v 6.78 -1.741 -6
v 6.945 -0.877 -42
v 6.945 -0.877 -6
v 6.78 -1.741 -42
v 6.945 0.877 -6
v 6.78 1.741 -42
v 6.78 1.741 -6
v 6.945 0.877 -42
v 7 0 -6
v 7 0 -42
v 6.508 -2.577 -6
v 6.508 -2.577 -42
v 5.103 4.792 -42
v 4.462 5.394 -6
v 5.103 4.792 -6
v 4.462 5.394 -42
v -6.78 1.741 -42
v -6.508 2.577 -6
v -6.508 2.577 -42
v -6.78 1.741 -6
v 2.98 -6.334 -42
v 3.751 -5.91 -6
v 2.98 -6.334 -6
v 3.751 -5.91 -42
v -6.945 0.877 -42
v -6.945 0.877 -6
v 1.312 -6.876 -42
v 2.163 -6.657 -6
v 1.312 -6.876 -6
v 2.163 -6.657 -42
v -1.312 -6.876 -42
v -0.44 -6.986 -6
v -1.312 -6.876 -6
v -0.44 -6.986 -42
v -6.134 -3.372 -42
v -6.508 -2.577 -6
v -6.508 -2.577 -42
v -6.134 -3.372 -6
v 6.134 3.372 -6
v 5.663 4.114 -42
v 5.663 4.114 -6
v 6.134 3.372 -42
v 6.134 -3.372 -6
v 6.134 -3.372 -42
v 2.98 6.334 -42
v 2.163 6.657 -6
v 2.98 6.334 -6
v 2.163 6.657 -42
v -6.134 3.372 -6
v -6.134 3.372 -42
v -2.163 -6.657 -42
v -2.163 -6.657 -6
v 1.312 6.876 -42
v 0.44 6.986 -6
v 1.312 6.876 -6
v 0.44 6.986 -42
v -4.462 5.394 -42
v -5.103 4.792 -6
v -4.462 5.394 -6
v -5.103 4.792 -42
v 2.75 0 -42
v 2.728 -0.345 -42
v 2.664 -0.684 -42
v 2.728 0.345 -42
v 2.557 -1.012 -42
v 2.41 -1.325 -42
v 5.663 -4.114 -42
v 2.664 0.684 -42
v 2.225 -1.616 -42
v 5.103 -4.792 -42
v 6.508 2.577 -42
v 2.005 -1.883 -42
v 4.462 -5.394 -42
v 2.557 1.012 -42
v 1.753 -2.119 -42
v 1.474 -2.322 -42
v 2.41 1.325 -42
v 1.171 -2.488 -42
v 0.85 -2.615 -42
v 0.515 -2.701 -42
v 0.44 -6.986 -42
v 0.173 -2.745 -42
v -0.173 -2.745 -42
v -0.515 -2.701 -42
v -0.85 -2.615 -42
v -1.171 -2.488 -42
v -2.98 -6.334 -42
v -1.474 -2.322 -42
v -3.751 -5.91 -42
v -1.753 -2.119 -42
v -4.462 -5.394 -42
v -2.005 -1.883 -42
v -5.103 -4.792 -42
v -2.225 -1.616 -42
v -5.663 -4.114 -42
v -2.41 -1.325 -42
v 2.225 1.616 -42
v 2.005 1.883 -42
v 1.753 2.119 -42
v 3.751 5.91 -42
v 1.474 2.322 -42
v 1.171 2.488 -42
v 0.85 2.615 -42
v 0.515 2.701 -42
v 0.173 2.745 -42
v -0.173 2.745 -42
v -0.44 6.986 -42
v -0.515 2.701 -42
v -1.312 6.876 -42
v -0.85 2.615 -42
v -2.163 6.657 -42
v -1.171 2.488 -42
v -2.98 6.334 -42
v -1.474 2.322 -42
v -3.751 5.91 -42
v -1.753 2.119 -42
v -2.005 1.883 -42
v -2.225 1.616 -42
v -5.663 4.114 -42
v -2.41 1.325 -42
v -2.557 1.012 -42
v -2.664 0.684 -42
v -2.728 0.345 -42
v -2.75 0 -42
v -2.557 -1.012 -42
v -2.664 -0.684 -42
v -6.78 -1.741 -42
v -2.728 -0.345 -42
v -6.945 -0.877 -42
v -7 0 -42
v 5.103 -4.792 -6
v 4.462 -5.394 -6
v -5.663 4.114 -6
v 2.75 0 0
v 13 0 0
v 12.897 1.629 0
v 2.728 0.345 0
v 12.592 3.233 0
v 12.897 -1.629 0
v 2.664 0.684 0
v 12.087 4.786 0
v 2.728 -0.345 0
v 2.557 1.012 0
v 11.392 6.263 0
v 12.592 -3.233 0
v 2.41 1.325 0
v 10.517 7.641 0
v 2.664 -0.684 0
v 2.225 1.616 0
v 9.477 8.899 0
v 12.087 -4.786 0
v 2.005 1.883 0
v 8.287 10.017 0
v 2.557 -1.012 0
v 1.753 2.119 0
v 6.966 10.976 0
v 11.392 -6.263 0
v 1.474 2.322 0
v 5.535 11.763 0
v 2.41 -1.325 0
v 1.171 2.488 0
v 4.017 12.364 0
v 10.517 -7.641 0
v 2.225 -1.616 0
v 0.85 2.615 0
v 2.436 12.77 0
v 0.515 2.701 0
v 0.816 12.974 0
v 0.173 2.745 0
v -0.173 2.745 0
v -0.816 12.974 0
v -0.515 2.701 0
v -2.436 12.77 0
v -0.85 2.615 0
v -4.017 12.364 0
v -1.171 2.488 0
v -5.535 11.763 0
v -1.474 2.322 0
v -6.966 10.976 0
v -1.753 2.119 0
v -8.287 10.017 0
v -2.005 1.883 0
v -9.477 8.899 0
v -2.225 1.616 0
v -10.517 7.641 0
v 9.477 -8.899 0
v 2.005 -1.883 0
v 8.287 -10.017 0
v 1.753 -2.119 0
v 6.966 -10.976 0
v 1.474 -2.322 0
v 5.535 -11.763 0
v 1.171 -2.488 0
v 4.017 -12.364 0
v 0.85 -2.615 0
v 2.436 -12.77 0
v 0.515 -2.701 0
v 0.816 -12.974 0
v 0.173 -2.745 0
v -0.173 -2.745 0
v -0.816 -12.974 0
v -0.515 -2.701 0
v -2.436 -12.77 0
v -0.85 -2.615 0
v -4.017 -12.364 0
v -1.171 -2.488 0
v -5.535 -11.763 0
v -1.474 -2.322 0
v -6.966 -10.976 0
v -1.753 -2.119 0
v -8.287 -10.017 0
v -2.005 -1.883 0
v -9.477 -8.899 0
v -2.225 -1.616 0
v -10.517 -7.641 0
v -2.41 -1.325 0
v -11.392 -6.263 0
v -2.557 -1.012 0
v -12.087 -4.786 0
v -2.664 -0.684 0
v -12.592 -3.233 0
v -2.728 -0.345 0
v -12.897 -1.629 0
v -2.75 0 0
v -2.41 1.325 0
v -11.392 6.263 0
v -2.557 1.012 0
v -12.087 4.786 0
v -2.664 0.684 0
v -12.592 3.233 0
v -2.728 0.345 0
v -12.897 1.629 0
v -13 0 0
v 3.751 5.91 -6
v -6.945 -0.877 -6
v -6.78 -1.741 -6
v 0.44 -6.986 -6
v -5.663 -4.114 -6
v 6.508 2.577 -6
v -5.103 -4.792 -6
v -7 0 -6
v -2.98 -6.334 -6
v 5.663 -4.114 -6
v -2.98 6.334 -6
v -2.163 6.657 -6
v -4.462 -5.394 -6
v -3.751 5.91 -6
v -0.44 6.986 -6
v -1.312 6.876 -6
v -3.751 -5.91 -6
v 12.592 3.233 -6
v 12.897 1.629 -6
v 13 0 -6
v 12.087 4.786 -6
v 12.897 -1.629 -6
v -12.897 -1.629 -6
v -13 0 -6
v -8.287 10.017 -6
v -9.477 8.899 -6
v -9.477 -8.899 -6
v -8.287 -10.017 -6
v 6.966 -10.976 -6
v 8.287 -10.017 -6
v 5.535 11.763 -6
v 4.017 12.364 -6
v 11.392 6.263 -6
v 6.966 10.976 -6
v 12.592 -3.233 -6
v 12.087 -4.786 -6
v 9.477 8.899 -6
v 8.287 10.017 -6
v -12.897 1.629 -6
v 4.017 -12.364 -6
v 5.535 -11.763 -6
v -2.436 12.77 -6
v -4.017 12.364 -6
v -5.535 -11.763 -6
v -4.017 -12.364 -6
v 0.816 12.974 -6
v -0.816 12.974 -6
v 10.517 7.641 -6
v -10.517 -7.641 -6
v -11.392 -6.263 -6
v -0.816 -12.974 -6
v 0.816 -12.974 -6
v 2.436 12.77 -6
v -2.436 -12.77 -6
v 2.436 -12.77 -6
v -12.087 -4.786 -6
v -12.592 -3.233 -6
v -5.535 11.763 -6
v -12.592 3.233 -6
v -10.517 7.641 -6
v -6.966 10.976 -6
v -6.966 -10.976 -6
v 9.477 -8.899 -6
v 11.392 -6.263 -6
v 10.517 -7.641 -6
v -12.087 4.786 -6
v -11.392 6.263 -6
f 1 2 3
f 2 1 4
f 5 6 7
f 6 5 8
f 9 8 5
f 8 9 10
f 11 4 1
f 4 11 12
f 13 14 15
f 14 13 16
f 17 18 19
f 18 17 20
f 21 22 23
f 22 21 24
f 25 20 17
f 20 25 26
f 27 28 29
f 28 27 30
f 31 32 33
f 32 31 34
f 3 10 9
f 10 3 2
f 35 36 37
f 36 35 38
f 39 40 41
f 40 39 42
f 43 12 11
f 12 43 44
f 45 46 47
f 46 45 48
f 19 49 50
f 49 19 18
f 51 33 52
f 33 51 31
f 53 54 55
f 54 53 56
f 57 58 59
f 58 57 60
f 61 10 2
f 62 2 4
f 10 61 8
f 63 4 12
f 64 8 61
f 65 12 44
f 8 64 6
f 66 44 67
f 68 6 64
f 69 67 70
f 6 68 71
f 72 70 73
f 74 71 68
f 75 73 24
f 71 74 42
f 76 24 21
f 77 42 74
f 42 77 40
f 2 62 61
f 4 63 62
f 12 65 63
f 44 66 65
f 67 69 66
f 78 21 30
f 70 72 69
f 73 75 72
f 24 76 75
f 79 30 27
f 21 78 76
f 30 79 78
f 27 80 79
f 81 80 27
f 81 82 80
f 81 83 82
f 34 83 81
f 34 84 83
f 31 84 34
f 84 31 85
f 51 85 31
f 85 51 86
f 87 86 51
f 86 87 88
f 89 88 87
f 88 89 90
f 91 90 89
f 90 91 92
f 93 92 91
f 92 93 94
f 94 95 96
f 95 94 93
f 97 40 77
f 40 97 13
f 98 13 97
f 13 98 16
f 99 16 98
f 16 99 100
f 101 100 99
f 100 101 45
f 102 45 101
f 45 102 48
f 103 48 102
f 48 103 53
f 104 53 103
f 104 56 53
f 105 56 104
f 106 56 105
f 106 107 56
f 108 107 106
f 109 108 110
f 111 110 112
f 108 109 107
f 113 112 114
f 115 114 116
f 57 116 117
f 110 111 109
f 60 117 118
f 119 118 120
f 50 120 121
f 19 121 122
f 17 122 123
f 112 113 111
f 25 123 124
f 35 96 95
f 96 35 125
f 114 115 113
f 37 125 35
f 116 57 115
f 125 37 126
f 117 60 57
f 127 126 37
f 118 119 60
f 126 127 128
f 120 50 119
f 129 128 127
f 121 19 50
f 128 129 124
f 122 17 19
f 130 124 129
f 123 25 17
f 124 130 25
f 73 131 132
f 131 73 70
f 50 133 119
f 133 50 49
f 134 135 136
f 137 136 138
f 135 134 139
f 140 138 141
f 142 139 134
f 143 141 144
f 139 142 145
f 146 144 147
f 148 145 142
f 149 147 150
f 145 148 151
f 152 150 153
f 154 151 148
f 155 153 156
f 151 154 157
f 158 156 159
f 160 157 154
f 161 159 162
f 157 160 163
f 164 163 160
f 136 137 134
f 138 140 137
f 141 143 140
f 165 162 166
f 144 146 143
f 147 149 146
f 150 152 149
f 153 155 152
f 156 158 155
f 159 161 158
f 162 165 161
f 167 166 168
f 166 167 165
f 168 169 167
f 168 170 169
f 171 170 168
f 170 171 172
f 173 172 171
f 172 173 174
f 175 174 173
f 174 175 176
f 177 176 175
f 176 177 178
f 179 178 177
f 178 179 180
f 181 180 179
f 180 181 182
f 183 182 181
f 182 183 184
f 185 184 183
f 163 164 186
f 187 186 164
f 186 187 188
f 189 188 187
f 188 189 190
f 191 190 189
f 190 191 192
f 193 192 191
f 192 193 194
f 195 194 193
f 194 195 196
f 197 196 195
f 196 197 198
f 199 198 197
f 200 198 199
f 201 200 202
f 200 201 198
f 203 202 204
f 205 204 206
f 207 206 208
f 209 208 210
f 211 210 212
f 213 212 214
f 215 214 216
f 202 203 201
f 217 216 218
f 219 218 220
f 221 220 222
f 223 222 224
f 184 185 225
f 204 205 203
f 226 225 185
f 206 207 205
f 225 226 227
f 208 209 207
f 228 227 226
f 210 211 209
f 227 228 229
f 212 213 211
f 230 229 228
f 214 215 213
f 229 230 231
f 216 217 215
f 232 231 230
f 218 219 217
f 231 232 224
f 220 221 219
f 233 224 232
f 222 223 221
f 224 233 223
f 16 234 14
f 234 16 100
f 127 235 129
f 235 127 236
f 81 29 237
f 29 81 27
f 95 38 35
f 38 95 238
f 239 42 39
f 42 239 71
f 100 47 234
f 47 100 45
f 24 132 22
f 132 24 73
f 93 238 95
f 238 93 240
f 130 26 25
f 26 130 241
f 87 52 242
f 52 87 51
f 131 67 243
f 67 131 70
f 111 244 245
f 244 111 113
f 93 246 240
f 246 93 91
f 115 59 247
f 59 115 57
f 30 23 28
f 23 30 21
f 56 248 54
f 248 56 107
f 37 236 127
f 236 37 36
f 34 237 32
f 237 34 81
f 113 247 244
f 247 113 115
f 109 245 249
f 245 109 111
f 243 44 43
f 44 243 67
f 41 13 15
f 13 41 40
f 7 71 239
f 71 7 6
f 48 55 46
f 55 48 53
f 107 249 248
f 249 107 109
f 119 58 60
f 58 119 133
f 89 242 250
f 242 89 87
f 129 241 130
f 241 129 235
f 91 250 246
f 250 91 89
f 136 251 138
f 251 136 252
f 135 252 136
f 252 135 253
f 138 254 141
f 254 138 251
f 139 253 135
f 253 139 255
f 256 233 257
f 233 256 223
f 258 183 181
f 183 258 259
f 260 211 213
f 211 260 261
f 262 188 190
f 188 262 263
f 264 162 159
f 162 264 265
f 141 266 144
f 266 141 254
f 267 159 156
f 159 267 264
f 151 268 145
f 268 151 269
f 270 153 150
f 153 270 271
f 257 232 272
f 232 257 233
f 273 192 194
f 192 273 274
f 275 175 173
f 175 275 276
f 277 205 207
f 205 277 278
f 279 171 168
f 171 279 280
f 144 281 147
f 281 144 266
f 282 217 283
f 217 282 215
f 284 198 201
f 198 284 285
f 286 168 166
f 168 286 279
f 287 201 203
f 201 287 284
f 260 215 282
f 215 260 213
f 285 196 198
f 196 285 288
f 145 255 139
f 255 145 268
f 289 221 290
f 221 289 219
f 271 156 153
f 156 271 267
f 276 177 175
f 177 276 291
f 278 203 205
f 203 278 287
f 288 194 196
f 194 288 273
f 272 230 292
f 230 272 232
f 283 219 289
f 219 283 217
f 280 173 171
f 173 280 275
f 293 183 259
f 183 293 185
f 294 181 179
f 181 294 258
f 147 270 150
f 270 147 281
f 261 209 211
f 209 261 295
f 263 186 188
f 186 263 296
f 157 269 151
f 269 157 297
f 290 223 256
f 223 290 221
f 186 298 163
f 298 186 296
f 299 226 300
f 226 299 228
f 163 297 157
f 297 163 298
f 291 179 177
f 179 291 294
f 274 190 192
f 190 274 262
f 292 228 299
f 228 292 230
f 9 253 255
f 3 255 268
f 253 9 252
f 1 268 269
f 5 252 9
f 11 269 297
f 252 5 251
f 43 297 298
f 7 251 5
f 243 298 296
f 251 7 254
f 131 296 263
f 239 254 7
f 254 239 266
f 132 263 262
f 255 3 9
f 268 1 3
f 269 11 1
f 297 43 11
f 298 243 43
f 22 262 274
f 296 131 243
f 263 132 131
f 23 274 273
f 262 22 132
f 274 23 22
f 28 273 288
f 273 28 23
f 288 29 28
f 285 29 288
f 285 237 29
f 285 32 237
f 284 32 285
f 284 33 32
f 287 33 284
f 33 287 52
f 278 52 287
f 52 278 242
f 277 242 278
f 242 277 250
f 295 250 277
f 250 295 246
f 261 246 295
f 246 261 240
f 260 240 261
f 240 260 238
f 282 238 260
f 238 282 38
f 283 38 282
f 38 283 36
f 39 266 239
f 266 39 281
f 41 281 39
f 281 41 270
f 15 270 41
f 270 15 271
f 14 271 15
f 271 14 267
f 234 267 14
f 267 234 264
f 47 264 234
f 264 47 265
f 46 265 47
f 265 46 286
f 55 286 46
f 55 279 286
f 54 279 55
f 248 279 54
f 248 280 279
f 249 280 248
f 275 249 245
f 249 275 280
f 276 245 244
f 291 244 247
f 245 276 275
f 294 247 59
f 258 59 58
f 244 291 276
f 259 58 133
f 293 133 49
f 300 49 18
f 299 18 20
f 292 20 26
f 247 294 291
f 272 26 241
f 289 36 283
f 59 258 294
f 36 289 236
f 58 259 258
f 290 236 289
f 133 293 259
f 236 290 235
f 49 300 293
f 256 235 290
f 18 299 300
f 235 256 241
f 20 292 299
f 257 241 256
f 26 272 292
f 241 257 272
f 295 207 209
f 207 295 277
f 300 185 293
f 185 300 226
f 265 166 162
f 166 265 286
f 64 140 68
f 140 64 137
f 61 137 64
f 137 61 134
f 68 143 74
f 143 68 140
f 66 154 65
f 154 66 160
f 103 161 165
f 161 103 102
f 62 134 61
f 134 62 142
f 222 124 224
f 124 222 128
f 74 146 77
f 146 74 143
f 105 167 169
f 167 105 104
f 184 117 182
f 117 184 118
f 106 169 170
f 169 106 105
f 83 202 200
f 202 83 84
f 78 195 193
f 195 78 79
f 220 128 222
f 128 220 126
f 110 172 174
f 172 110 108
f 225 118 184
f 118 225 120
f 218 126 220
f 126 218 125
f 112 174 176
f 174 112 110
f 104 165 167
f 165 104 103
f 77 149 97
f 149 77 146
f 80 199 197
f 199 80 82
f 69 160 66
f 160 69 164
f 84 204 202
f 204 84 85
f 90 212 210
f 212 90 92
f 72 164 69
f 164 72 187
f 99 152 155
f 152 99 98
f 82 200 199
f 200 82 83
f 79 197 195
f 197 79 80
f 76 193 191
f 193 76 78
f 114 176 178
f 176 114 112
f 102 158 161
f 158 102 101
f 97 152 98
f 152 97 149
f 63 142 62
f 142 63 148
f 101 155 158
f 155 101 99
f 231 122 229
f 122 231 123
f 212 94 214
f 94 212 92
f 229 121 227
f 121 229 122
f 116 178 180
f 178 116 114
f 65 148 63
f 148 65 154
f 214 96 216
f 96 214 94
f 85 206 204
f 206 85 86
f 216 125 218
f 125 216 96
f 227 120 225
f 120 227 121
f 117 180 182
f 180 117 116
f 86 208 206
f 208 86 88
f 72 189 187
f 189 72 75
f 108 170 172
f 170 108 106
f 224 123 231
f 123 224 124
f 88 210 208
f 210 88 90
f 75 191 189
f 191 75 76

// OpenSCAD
$fn = 50;


difference() {
	union() {
		translate(v = [0, 0, -42.0000000000]) {
			cylinder(h = 42, r = 7.0000000000);
		}
		translate(v = [0, 0, -6.0000000000]) {
			cylinder(h = 6, r = 13.0000000000);
		}
	}
	union() {
		#translate(v = [0, 0, -42]) {
			cylinder(h = 42, r = 2.7500000000);
		}
	}
}
